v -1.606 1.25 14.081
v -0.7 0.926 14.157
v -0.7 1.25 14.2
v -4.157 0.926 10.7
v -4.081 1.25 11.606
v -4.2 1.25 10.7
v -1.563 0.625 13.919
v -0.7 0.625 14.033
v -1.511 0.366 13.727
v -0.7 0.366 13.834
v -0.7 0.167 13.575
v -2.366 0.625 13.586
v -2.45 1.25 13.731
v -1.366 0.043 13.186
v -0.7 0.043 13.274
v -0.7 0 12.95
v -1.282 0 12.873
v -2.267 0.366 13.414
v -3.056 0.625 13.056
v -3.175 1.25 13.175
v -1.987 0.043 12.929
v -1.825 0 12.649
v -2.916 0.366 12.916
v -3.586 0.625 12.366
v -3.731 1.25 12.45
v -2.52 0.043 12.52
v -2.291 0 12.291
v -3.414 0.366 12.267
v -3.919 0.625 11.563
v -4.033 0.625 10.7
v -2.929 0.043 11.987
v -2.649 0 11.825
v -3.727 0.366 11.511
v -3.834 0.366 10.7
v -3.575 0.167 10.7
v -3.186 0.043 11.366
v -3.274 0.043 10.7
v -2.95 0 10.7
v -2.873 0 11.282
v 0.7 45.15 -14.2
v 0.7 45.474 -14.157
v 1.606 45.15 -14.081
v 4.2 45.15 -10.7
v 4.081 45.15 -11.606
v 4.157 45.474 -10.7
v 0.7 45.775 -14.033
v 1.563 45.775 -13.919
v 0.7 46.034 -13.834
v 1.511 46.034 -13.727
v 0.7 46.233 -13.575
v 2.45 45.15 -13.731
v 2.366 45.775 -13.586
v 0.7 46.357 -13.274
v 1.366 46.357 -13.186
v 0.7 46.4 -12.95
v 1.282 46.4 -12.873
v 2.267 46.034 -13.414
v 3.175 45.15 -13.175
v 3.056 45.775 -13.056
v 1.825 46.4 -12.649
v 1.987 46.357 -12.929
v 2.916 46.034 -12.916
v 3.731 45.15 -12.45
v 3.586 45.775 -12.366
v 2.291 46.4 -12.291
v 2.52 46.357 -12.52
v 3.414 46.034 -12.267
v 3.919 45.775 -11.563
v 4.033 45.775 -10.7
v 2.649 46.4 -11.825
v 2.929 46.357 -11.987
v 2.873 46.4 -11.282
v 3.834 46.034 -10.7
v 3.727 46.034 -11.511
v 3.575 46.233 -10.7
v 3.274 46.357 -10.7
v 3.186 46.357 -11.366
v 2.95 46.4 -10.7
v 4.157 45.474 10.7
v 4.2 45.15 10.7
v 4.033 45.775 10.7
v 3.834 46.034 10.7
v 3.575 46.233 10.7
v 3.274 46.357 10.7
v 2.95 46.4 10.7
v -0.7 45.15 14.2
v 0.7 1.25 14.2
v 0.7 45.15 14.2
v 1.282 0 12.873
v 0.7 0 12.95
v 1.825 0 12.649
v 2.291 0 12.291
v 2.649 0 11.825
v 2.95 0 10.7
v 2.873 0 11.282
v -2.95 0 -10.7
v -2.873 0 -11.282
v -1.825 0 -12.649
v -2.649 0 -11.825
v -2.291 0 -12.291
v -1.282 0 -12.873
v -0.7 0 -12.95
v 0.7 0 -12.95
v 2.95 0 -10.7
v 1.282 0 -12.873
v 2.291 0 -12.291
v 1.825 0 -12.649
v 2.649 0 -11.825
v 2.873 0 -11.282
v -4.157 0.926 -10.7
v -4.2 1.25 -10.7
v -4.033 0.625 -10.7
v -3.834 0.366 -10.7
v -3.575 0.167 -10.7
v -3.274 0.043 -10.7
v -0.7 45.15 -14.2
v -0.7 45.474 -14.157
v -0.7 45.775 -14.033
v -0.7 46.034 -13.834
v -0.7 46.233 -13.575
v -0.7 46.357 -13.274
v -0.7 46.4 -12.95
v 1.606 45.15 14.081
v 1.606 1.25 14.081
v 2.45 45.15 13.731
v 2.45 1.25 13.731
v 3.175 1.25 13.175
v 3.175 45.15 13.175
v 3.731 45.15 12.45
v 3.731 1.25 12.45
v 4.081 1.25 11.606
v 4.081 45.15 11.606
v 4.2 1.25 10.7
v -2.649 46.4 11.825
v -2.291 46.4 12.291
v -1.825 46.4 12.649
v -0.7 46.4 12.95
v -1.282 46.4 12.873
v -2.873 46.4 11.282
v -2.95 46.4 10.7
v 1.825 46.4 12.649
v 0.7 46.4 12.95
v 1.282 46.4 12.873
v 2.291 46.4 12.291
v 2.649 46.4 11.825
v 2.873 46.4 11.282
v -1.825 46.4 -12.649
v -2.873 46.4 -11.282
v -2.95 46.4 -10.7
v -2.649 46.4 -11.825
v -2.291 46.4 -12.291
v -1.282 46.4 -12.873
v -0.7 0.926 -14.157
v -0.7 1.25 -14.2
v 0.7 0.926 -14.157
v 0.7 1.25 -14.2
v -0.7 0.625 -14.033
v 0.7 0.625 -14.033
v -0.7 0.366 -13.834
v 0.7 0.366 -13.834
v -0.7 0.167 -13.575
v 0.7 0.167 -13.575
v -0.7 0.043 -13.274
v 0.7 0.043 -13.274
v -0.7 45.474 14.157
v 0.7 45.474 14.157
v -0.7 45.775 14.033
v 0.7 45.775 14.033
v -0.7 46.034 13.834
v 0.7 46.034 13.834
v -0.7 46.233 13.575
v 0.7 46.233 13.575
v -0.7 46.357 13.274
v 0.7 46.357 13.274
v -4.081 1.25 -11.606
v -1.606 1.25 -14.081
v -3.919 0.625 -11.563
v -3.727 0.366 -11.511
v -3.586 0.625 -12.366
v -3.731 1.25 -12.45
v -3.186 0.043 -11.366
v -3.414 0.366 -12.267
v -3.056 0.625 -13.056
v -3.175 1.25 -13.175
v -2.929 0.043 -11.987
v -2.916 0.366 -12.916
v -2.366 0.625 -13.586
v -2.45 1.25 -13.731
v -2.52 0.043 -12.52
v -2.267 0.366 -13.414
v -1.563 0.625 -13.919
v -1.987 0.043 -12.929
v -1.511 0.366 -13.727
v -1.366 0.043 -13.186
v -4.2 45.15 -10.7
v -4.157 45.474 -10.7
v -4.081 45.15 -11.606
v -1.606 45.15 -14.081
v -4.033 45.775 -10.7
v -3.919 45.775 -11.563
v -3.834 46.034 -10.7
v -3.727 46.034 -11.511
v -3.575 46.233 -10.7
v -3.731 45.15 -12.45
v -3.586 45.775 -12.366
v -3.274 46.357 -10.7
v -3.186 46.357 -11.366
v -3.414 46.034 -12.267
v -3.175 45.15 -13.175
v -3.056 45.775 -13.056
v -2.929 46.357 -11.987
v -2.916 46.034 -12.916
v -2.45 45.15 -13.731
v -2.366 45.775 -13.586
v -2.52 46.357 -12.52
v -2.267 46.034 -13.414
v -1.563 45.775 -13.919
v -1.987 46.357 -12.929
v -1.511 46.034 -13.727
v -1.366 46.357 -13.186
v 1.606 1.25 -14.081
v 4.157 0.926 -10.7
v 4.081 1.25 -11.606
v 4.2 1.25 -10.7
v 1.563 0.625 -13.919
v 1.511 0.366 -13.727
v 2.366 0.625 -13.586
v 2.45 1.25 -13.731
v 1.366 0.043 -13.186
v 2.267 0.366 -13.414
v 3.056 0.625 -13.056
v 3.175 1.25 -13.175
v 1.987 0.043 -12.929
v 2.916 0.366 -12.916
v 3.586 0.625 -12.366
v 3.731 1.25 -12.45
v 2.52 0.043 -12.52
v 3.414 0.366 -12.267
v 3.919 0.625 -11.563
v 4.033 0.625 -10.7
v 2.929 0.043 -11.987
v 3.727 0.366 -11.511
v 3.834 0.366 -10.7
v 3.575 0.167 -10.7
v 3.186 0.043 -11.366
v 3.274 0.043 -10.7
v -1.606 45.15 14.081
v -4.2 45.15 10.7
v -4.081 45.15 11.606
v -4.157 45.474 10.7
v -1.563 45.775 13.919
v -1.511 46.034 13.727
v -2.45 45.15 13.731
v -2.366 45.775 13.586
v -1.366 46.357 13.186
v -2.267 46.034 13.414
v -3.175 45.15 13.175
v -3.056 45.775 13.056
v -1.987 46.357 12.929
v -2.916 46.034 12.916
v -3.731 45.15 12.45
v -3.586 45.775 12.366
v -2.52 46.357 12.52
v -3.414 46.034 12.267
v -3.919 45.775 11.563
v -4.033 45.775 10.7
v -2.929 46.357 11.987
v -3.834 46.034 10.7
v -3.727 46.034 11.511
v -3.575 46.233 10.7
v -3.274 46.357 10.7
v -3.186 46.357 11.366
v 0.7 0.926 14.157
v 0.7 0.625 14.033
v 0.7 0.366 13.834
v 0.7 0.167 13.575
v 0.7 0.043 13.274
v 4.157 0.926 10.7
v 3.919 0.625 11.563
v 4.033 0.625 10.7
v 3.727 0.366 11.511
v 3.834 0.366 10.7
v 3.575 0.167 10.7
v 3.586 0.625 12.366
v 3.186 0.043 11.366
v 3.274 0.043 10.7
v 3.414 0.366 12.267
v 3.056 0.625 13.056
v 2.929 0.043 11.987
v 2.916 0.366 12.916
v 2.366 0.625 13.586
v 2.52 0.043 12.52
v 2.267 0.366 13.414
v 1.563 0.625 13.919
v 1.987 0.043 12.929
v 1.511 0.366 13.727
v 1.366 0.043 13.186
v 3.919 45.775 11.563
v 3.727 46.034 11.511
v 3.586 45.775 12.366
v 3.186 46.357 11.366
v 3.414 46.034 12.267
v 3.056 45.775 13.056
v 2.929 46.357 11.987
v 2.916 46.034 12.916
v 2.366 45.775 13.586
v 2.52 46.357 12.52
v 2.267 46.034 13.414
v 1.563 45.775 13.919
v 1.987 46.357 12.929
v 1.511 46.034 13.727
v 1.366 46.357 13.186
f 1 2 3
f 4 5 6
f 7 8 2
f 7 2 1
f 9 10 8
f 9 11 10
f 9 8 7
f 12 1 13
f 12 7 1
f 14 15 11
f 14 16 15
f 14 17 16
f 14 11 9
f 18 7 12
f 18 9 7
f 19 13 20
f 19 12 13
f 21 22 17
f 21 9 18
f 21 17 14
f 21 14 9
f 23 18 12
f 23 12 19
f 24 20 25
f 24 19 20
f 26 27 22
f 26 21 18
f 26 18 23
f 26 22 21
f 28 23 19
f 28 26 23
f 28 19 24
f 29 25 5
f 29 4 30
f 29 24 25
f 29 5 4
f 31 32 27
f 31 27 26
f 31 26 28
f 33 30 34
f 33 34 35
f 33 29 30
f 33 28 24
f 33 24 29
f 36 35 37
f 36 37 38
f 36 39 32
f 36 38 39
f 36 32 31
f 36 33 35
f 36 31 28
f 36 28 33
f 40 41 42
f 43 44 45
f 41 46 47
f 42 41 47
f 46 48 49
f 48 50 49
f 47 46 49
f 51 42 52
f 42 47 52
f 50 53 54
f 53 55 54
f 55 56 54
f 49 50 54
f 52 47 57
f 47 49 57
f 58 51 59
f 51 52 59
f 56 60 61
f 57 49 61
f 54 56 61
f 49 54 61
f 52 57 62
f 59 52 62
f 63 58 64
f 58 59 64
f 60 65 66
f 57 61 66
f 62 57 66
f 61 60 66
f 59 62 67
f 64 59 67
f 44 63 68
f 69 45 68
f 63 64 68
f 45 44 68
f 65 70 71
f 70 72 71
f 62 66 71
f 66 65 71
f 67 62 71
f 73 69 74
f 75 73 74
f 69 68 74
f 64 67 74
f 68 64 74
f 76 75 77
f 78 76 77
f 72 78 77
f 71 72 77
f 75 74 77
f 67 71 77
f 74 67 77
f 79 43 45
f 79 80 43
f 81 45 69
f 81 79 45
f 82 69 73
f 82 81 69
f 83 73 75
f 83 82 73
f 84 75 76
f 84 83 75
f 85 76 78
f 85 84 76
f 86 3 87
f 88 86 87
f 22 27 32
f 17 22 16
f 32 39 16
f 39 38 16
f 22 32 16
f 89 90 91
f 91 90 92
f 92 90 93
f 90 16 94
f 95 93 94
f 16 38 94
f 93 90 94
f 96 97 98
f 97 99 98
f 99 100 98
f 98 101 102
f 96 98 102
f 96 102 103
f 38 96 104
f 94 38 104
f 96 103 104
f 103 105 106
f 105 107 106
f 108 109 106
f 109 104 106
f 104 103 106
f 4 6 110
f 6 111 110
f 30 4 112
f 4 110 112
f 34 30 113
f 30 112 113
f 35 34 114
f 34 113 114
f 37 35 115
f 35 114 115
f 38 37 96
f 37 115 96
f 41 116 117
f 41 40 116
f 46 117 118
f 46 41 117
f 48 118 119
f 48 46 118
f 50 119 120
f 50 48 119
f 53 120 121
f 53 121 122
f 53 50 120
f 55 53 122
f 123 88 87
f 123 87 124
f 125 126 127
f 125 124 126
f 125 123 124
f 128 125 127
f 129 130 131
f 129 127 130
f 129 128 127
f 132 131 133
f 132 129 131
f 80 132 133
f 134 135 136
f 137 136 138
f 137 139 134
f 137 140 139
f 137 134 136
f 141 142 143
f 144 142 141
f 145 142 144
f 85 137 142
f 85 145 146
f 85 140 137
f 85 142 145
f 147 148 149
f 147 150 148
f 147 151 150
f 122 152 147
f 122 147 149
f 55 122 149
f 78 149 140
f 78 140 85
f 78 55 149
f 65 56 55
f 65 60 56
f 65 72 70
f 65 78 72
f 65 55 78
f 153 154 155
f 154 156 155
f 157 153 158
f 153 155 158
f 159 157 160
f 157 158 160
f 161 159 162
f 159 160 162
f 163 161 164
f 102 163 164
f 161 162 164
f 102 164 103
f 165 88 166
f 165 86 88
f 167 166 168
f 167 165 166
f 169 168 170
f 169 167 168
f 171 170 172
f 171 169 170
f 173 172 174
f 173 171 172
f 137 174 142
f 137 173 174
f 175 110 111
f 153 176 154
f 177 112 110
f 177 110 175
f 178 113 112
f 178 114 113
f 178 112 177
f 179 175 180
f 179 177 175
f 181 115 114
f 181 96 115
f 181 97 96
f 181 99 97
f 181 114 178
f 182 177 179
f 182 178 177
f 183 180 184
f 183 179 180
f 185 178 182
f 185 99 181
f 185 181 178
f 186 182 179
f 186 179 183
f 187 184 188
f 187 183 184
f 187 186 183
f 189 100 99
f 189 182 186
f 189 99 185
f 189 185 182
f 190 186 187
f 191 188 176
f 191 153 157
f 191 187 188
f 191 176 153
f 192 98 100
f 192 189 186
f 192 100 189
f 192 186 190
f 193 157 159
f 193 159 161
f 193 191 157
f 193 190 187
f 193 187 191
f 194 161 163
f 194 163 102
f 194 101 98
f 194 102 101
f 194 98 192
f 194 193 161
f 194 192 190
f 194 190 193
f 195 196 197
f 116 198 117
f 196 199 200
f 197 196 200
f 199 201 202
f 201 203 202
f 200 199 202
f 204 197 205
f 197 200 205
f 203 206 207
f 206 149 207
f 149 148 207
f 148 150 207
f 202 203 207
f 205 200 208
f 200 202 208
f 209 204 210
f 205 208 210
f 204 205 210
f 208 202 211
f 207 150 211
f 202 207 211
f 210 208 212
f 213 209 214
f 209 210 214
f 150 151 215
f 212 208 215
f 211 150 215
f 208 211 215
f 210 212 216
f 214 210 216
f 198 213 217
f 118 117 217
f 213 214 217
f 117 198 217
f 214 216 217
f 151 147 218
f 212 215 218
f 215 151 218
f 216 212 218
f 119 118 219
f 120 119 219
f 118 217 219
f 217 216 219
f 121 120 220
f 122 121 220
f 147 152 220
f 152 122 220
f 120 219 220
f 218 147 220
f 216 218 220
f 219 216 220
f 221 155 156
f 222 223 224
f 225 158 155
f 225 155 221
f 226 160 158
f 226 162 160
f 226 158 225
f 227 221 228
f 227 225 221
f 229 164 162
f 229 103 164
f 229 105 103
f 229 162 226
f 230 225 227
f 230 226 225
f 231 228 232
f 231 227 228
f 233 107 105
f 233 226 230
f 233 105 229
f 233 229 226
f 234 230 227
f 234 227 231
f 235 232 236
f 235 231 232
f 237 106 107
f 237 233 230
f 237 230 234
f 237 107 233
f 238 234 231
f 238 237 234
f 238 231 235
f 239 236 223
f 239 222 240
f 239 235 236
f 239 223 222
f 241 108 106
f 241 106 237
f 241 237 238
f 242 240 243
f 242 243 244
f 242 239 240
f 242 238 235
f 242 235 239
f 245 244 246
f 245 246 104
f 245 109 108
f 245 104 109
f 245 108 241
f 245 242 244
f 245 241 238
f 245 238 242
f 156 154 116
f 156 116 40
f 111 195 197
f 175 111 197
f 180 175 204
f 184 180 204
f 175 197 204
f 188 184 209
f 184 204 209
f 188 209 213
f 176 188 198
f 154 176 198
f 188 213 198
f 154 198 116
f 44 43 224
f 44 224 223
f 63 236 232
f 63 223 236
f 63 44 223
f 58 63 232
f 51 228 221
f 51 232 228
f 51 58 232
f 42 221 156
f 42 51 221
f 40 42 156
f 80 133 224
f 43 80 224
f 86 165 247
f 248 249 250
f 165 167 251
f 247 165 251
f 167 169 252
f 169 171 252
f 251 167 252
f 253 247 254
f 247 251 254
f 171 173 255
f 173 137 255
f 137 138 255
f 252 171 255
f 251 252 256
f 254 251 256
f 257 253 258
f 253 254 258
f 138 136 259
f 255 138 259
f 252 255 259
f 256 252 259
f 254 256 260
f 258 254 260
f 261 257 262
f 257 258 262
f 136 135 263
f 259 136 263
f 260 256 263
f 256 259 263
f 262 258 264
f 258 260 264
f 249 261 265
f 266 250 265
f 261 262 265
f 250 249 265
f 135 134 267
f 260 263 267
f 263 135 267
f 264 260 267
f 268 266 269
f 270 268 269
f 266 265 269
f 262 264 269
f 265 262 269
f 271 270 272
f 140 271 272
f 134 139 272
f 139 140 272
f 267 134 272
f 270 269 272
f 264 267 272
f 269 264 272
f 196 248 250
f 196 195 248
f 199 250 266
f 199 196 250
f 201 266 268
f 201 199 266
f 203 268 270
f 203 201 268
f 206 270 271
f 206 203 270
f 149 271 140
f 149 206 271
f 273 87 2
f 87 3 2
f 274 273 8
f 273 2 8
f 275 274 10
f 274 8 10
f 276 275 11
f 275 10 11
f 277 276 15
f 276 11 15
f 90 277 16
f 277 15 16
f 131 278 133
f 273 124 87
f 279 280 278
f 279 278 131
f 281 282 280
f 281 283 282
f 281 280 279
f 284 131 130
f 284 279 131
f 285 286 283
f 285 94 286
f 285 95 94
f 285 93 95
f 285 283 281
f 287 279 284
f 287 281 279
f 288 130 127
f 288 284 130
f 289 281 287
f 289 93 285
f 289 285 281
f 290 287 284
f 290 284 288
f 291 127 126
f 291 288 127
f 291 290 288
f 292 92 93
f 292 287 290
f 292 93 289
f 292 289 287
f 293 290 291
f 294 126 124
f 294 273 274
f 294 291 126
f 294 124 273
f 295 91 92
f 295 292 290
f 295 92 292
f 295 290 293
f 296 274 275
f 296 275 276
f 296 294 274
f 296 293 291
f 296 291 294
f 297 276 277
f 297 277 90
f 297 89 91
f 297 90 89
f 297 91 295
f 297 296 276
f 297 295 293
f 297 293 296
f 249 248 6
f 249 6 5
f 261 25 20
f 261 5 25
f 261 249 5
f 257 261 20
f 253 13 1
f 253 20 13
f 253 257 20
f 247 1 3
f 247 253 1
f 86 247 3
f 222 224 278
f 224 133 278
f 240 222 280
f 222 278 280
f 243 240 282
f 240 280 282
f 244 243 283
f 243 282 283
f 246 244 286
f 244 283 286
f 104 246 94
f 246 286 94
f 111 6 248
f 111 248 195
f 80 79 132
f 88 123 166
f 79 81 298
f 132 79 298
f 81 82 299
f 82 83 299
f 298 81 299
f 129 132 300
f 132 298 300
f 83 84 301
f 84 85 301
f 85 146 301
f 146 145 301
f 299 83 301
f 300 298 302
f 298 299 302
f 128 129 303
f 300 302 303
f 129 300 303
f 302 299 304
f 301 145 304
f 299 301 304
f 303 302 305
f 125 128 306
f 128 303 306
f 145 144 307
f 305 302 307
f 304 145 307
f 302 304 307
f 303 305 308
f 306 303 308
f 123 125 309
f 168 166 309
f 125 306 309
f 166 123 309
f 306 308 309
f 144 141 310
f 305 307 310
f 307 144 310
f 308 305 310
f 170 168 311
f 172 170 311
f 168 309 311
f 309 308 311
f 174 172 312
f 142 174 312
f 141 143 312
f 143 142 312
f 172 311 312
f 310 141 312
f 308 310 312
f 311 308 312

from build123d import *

# Parameters (mm, degrees)
SKETCH1_W           = 8.4
SKETCH1_H           = 28.4
BOSS_EXTRUDE1_DEPTH = 46.4
FILLET1_R           = 3.5
FILLET2_R           = 1.25


with BuildPart() as part:
    # Sketch1 → Boss-Extrude1 (new body)
    with BuildSketch(Plane(origin=(0, 0, 0), x_dir=(1, 0, 0), z_dir=(0, 1, 0))):
        Rectangle(SKETCH1_W, SKETCH1_H)
    extrude(amount=BOSS_EXTRUDE1_DEPTH)

    # Fillet1
    fillet1_edges = [part.edges().sort_by_distance(p)[0] for p in [
        (4.2, 23.2, 14.2),
        (-4.2, 23.2, 14.2),
        (-4.2, 23.2, -14.2),
        (4.2, 23.2, -14.2),
    ]]
    fillet(fillet1_edges, radius=FILLET1_R)

    # Fillet2
    fillet2_edges = [part.edges().sort_by_distance(p)[0] for p in [
        (-4.2, 0, 0),
        (-4.2, 46.4, 0),
        (4.2, 0, 0),
        (0, 0, 14.2),
        (0, 0, -14.2),
        (-3.174873734, 0, 13.174873734),
        (3.174873734, 0, 13.174873734),
        (3.174873734, 0, -13.174873734),
        (-3.174873734, 0, -13.174873734),
        (0, 46.4, -14.2),
        (4.2, 46.4, 0),
        (0, 46.4, 14.2),
        (-3.174873734, 46.4, 13.174873734),
        (3.174873734, 46.4, 13.174873734),
        (3.174873734, 46.4, -13.174873734),
        (-3.174873734, 46.4, -13.174873734),
    ]]
    fillet(fillet2_edges, radius=FILLET2_R)


solid = part.part
